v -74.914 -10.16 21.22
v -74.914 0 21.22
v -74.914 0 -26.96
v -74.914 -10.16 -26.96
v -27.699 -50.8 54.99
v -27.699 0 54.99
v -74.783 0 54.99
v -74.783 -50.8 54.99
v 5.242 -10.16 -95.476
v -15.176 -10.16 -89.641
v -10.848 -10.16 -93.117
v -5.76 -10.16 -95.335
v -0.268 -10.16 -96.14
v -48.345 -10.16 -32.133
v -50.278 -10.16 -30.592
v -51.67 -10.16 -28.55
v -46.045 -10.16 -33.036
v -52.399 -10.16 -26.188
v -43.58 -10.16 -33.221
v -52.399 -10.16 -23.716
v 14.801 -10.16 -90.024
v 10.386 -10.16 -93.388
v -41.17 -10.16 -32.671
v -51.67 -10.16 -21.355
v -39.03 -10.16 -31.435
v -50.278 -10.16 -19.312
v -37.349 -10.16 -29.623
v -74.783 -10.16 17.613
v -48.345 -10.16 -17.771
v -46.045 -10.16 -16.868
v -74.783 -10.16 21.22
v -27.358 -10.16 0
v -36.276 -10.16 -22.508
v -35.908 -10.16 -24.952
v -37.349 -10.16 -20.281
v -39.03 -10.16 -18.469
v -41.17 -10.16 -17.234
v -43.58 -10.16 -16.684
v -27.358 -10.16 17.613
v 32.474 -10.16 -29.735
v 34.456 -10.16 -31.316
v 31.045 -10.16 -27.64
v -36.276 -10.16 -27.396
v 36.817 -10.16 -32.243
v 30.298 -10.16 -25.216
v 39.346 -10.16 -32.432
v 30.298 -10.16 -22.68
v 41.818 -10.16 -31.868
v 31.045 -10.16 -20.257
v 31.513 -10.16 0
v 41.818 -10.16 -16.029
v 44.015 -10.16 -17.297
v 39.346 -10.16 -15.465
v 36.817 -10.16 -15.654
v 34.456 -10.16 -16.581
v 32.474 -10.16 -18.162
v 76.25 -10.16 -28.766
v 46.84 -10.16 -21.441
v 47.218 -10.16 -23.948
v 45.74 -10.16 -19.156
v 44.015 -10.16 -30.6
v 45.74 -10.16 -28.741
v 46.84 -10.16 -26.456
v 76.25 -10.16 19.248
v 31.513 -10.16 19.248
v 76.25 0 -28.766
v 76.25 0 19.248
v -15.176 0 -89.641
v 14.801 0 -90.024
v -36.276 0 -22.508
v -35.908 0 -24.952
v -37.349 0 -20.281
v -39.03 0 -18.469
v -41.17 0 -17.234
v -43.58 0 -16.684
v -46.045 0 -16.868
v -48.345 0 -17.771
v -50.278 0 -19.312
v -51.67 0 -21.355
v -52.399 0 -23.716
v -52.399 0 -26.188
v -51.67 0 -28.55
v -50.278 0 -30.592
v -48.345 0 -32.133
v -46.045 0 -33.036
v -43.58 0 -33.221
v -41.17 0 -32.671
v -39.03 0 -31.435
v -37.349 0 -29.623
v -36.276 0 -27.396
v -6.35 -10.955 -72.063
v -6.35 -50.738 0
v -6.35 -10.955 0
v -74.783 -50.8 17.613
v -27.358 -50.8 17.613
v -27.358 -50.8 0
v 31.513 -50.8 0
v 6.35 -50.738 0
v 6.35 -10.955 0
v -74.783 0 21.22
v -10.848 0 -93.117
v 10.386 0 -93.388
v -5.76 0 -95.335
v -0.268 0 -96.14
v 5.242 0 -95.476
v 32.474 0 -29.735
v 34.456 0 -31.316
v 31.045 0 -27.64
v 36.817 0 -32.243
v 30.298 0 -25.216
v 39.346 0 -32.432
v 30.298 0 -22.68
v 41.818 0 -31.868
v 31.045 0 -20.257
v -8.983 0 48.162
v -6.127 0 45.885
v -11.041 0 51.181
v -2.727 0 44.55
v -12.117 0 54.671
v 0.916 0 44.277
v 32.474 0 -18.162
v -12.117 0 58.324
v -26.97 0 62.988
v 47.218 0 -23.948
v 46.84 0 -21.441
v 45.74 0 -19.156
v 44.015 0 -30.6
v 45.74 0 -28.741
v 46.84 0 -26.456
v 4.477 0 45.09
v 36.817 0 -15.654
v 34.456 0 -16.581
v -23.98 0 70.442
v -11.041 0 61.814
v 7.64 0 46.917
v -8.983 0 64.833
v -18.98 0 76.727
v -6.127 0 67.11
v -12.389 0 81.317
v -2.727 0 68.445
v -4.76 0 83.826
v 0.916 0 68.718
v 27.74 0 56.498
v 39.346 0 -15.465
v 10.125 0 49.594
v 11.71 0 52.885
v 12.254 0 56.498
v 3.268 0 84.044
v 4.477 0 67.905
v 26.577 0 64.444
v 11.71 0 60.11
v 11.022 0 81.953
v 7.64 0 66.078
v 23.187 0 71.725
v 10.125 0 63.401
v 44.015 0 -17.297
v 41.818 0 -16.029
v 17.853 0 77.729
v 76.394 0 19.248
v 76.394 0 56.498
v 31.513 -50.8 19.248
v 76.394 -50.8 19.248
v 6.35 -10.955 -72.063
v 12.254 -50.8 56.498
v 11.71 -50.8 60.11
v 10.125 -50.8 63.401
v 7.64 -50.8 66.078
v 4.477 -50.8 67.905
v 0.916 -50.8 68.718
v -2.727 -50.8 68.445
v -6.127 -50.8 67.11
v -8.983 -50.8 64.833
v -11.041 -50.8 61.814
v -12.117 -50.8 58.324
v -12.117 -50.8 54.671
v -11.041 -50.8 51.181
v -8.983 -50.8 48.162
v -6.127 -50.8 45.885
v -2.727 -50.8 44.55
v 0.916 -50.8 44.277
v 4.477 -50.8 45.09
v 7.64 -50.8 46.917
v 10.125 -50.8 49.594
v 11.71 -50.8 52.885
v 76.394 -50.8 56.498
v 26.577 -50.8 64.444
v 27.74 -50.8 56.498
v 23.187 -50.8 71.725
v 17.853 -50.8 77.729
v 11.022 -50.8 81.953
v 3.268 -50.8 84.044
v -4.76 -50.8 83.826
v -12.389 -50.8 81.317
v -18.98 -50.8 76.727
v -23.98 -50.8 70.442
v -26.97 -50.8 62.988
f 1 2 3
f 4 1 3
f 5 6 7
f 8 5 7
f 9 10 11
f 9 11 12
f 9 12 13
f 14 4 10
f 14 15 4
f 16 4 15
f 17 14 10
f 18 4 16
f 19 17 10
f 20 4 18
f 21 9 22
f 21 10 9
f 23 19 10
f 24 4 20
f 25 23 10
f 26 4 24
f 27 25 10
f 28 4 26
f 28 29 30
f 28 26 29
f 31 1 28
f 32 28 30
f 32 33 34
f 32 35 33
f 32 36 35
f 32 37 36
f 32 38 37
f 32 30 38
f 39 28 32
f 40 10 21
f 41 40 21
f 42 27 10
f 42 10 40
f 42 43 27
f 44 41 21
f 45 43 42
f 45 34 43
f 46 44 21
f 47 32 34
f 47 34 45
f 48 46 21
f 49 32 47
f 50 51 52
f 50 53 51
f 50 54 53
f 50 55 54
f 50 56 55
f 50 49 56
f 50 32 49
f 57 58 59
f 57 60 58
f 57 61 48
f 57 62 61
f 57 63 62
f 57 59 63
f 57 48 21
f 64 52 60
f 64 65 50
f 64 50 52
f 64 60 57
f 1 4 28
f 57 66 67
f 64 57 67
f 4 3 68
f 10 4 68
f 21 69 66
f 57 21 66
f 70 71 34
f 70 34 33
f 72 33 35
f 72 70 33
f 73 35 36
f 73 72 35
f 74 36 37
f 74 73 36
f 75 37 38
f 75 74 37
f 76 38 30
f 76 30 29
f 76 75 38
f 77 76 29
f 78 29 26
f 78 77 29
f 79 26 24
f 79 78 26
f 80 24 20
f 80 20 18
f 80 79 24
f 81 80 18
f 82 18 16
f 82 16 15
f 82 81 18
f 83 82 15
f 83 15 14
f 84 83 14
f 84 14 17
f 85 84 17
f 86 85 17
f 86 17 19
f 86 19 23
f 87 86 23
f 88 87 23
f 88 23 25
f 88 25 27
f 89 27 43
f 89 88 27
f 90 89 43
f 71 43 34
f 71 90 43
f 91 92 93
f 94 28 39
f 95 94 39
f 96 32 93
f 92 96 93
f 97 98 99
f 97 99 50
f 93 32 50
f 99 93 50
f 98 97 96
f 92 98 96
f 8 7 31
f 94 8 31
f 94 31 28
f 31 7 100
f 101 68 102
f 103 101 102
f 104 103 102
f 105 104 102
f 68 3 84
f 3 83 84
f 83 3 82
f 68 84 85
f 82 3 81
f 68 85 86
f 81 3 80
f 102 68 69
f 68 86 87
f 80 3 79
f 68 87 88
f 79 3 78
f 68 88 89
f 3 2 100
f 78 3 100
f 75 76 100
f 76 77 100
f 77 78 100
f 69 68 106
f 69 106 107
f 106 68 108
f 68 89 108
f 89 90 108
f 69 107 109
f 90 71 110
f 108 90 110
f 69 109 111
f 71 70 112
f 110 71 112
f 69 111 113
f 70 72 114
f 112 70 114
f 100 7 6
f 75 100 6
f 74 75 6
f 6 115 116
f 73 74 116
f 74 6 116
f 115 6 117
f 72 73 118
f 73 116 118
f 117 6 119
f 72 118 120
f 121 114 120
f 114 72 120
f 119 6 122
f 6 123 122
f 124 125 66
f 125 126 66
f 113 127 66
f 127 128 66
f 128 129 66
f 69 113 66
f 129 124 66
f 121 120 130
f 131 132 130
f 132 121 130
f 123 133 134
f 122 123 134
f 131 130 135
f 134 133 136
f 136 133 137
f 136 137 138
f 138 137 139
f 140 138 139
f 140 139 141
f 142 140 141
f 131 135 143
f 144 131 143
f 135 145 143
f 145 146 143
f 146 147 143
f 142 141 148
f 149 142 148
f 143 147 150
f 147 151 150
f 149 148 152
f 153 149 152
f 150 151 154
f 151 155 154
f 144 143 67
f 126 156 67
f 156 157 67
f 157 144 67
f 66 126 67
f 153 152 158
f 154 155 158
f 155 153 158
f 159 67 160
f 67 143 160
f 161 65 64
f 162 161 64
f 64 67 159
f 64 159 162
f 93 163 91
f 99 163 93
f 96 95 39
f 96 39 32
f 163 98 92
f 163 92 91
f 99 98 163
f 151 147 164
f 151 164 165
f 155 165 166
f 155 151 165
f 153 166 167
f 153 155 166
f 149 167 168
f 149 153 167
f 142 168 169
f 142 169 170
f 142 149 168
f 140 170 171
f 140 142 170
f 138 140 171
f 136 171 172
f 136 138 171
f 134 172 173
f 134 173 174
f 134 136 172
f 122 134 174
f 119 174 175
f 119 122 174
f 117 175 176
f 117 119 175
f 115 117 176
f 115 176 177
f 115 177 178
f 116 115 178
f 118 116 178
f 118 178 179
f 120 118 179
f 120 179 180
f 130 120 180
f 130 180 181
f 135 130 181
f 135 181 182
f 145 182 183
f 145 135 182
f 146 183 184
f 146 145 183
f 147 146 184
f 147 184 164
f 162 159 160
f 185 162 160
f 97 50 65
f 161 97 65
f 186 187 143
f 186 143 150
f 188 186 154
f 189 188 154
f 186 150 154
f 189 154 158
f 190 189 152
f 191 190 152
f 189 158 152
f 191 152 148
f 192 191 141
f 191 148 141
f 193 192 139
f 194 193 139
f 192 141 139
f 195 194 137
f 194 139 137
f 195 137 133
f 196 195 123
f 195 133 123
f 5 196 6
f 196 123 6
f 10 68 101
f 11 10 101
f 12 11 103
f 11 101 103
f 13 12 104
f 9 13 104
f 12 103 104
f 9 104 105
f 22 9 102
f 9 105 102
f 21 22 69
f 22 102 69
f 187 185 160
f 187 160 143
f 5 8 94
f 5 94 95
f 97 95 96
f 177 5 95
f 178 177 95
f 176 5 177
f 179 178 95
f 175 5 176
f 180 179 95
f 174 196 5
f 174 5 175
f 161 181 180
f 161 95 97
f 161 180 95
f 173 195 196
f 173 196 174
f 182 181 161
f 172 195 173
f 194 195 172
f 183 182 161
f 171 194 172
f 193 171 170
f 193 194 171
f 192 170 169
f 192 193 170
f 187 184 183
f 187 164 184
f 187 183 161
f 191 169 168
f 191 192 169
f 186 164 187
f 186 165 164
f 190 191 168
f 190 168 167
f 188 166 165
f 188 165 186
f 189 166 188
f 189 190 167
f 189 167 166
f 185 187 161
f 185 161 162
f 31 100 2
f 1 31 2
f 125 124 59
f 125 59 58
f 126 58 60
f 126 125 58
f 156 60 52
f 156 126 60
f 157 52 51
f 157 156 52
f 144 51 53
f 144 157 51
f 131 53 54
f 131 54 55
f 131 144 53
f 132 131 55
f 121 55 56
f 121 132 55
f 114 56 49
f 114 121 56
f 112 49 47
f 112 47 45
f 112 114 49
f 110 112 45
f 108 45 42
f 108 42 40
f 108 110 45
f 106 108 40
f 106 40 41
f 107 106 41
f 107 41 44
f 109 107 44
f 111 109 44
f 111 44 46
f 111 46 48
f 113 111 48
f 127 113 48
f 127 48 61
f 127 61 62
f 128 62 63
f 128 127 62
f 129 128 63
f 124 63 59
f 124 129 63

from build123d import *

# Parameters (mm, degrees)
F0_R     = 12.254349
F1_DEPTH = 50.8
F2_R     = 8.291725
F2_R_2   = 8.507614
F3_DEPTH = 10.16
F5_DEPTH = 6.35


with BuildPart() as f1:
    # F0 (on Front) → F1 (new body)
    with BuildSketch(Plane.XZ):
        with BuildLine():
            Line((76.394036, 56.497514), (27.739568, 56.497514))
            ThreePointArc((27.739568, 56.497514), (-0.754078, 84.226831), (-27.69857, 54.989916))
            Line((-27.69857, 54.989916), (-74.78258, 54.989916))
            Line((-74.78258, 54.989916), (-74.78258, 17.613143))
            Line((-74.78258, 17.613143), (-27.358174, 17.613143))
            Line((-27.358174, 17.613143), (-27.358174, 0))
            Line((-27.358174, 0), (0, 0))
            Line((0, 0), (31.513482, 0))
            Line((31.513482, 0), (31.513482, 19.248471))
            Line((31.513482, 19.248471), (76.394036, 19.248471))
            Line((76.394036, 19.248471), (76.394036, 56.497514))
        make_face()
        with Locations((0, 56.497514)):
            Circle(F0_R, mode=Mode.SUBTRACT)
    extrude(amount=F1_DEPTH)

    # F2 (on Front) → F3 (join)
    with BuildSketch(Plane.XZ):
        with BuildLine():
            Line((-74.914232, -26.959702), (-15.175805, -89.64081))
            ThreePointArc((-15.175805, -89.64081), (-0.268287, -96.139845), (14.800677, -90.024463))
            Line((14.800677, -90.024463), (76.250419, -28.766453))
            Line((76.250419, -28.766453), (76.250419, 21.220267))
            Line((76.250419, 21.220267), (-74.914232, 21.220267))
            Line((-74.914232, 21.220267), (-74.914232, -26.959702))
        make_face()
        with Locations((-44.199497, -24.952203)):
            Circle(F2_R, mode=Mode.SUBTRACT)
        with Locations((38.710192, -23.948461)):
            Circle(F2_R_2, mode=Mode.SUBTRACT)
    extrude(amount=F3_DEPTH)

    # F4 (on Right) → F5 (join, symmetric)
    with BuildSketch(Plane.YZ):
        Polygon((-10.954797, 0), (-50.737962, 0), (-10.954797, -72.062641), align=None)
    extrude(amount=F5_DEPTH, both=True)


solid = f1.part
